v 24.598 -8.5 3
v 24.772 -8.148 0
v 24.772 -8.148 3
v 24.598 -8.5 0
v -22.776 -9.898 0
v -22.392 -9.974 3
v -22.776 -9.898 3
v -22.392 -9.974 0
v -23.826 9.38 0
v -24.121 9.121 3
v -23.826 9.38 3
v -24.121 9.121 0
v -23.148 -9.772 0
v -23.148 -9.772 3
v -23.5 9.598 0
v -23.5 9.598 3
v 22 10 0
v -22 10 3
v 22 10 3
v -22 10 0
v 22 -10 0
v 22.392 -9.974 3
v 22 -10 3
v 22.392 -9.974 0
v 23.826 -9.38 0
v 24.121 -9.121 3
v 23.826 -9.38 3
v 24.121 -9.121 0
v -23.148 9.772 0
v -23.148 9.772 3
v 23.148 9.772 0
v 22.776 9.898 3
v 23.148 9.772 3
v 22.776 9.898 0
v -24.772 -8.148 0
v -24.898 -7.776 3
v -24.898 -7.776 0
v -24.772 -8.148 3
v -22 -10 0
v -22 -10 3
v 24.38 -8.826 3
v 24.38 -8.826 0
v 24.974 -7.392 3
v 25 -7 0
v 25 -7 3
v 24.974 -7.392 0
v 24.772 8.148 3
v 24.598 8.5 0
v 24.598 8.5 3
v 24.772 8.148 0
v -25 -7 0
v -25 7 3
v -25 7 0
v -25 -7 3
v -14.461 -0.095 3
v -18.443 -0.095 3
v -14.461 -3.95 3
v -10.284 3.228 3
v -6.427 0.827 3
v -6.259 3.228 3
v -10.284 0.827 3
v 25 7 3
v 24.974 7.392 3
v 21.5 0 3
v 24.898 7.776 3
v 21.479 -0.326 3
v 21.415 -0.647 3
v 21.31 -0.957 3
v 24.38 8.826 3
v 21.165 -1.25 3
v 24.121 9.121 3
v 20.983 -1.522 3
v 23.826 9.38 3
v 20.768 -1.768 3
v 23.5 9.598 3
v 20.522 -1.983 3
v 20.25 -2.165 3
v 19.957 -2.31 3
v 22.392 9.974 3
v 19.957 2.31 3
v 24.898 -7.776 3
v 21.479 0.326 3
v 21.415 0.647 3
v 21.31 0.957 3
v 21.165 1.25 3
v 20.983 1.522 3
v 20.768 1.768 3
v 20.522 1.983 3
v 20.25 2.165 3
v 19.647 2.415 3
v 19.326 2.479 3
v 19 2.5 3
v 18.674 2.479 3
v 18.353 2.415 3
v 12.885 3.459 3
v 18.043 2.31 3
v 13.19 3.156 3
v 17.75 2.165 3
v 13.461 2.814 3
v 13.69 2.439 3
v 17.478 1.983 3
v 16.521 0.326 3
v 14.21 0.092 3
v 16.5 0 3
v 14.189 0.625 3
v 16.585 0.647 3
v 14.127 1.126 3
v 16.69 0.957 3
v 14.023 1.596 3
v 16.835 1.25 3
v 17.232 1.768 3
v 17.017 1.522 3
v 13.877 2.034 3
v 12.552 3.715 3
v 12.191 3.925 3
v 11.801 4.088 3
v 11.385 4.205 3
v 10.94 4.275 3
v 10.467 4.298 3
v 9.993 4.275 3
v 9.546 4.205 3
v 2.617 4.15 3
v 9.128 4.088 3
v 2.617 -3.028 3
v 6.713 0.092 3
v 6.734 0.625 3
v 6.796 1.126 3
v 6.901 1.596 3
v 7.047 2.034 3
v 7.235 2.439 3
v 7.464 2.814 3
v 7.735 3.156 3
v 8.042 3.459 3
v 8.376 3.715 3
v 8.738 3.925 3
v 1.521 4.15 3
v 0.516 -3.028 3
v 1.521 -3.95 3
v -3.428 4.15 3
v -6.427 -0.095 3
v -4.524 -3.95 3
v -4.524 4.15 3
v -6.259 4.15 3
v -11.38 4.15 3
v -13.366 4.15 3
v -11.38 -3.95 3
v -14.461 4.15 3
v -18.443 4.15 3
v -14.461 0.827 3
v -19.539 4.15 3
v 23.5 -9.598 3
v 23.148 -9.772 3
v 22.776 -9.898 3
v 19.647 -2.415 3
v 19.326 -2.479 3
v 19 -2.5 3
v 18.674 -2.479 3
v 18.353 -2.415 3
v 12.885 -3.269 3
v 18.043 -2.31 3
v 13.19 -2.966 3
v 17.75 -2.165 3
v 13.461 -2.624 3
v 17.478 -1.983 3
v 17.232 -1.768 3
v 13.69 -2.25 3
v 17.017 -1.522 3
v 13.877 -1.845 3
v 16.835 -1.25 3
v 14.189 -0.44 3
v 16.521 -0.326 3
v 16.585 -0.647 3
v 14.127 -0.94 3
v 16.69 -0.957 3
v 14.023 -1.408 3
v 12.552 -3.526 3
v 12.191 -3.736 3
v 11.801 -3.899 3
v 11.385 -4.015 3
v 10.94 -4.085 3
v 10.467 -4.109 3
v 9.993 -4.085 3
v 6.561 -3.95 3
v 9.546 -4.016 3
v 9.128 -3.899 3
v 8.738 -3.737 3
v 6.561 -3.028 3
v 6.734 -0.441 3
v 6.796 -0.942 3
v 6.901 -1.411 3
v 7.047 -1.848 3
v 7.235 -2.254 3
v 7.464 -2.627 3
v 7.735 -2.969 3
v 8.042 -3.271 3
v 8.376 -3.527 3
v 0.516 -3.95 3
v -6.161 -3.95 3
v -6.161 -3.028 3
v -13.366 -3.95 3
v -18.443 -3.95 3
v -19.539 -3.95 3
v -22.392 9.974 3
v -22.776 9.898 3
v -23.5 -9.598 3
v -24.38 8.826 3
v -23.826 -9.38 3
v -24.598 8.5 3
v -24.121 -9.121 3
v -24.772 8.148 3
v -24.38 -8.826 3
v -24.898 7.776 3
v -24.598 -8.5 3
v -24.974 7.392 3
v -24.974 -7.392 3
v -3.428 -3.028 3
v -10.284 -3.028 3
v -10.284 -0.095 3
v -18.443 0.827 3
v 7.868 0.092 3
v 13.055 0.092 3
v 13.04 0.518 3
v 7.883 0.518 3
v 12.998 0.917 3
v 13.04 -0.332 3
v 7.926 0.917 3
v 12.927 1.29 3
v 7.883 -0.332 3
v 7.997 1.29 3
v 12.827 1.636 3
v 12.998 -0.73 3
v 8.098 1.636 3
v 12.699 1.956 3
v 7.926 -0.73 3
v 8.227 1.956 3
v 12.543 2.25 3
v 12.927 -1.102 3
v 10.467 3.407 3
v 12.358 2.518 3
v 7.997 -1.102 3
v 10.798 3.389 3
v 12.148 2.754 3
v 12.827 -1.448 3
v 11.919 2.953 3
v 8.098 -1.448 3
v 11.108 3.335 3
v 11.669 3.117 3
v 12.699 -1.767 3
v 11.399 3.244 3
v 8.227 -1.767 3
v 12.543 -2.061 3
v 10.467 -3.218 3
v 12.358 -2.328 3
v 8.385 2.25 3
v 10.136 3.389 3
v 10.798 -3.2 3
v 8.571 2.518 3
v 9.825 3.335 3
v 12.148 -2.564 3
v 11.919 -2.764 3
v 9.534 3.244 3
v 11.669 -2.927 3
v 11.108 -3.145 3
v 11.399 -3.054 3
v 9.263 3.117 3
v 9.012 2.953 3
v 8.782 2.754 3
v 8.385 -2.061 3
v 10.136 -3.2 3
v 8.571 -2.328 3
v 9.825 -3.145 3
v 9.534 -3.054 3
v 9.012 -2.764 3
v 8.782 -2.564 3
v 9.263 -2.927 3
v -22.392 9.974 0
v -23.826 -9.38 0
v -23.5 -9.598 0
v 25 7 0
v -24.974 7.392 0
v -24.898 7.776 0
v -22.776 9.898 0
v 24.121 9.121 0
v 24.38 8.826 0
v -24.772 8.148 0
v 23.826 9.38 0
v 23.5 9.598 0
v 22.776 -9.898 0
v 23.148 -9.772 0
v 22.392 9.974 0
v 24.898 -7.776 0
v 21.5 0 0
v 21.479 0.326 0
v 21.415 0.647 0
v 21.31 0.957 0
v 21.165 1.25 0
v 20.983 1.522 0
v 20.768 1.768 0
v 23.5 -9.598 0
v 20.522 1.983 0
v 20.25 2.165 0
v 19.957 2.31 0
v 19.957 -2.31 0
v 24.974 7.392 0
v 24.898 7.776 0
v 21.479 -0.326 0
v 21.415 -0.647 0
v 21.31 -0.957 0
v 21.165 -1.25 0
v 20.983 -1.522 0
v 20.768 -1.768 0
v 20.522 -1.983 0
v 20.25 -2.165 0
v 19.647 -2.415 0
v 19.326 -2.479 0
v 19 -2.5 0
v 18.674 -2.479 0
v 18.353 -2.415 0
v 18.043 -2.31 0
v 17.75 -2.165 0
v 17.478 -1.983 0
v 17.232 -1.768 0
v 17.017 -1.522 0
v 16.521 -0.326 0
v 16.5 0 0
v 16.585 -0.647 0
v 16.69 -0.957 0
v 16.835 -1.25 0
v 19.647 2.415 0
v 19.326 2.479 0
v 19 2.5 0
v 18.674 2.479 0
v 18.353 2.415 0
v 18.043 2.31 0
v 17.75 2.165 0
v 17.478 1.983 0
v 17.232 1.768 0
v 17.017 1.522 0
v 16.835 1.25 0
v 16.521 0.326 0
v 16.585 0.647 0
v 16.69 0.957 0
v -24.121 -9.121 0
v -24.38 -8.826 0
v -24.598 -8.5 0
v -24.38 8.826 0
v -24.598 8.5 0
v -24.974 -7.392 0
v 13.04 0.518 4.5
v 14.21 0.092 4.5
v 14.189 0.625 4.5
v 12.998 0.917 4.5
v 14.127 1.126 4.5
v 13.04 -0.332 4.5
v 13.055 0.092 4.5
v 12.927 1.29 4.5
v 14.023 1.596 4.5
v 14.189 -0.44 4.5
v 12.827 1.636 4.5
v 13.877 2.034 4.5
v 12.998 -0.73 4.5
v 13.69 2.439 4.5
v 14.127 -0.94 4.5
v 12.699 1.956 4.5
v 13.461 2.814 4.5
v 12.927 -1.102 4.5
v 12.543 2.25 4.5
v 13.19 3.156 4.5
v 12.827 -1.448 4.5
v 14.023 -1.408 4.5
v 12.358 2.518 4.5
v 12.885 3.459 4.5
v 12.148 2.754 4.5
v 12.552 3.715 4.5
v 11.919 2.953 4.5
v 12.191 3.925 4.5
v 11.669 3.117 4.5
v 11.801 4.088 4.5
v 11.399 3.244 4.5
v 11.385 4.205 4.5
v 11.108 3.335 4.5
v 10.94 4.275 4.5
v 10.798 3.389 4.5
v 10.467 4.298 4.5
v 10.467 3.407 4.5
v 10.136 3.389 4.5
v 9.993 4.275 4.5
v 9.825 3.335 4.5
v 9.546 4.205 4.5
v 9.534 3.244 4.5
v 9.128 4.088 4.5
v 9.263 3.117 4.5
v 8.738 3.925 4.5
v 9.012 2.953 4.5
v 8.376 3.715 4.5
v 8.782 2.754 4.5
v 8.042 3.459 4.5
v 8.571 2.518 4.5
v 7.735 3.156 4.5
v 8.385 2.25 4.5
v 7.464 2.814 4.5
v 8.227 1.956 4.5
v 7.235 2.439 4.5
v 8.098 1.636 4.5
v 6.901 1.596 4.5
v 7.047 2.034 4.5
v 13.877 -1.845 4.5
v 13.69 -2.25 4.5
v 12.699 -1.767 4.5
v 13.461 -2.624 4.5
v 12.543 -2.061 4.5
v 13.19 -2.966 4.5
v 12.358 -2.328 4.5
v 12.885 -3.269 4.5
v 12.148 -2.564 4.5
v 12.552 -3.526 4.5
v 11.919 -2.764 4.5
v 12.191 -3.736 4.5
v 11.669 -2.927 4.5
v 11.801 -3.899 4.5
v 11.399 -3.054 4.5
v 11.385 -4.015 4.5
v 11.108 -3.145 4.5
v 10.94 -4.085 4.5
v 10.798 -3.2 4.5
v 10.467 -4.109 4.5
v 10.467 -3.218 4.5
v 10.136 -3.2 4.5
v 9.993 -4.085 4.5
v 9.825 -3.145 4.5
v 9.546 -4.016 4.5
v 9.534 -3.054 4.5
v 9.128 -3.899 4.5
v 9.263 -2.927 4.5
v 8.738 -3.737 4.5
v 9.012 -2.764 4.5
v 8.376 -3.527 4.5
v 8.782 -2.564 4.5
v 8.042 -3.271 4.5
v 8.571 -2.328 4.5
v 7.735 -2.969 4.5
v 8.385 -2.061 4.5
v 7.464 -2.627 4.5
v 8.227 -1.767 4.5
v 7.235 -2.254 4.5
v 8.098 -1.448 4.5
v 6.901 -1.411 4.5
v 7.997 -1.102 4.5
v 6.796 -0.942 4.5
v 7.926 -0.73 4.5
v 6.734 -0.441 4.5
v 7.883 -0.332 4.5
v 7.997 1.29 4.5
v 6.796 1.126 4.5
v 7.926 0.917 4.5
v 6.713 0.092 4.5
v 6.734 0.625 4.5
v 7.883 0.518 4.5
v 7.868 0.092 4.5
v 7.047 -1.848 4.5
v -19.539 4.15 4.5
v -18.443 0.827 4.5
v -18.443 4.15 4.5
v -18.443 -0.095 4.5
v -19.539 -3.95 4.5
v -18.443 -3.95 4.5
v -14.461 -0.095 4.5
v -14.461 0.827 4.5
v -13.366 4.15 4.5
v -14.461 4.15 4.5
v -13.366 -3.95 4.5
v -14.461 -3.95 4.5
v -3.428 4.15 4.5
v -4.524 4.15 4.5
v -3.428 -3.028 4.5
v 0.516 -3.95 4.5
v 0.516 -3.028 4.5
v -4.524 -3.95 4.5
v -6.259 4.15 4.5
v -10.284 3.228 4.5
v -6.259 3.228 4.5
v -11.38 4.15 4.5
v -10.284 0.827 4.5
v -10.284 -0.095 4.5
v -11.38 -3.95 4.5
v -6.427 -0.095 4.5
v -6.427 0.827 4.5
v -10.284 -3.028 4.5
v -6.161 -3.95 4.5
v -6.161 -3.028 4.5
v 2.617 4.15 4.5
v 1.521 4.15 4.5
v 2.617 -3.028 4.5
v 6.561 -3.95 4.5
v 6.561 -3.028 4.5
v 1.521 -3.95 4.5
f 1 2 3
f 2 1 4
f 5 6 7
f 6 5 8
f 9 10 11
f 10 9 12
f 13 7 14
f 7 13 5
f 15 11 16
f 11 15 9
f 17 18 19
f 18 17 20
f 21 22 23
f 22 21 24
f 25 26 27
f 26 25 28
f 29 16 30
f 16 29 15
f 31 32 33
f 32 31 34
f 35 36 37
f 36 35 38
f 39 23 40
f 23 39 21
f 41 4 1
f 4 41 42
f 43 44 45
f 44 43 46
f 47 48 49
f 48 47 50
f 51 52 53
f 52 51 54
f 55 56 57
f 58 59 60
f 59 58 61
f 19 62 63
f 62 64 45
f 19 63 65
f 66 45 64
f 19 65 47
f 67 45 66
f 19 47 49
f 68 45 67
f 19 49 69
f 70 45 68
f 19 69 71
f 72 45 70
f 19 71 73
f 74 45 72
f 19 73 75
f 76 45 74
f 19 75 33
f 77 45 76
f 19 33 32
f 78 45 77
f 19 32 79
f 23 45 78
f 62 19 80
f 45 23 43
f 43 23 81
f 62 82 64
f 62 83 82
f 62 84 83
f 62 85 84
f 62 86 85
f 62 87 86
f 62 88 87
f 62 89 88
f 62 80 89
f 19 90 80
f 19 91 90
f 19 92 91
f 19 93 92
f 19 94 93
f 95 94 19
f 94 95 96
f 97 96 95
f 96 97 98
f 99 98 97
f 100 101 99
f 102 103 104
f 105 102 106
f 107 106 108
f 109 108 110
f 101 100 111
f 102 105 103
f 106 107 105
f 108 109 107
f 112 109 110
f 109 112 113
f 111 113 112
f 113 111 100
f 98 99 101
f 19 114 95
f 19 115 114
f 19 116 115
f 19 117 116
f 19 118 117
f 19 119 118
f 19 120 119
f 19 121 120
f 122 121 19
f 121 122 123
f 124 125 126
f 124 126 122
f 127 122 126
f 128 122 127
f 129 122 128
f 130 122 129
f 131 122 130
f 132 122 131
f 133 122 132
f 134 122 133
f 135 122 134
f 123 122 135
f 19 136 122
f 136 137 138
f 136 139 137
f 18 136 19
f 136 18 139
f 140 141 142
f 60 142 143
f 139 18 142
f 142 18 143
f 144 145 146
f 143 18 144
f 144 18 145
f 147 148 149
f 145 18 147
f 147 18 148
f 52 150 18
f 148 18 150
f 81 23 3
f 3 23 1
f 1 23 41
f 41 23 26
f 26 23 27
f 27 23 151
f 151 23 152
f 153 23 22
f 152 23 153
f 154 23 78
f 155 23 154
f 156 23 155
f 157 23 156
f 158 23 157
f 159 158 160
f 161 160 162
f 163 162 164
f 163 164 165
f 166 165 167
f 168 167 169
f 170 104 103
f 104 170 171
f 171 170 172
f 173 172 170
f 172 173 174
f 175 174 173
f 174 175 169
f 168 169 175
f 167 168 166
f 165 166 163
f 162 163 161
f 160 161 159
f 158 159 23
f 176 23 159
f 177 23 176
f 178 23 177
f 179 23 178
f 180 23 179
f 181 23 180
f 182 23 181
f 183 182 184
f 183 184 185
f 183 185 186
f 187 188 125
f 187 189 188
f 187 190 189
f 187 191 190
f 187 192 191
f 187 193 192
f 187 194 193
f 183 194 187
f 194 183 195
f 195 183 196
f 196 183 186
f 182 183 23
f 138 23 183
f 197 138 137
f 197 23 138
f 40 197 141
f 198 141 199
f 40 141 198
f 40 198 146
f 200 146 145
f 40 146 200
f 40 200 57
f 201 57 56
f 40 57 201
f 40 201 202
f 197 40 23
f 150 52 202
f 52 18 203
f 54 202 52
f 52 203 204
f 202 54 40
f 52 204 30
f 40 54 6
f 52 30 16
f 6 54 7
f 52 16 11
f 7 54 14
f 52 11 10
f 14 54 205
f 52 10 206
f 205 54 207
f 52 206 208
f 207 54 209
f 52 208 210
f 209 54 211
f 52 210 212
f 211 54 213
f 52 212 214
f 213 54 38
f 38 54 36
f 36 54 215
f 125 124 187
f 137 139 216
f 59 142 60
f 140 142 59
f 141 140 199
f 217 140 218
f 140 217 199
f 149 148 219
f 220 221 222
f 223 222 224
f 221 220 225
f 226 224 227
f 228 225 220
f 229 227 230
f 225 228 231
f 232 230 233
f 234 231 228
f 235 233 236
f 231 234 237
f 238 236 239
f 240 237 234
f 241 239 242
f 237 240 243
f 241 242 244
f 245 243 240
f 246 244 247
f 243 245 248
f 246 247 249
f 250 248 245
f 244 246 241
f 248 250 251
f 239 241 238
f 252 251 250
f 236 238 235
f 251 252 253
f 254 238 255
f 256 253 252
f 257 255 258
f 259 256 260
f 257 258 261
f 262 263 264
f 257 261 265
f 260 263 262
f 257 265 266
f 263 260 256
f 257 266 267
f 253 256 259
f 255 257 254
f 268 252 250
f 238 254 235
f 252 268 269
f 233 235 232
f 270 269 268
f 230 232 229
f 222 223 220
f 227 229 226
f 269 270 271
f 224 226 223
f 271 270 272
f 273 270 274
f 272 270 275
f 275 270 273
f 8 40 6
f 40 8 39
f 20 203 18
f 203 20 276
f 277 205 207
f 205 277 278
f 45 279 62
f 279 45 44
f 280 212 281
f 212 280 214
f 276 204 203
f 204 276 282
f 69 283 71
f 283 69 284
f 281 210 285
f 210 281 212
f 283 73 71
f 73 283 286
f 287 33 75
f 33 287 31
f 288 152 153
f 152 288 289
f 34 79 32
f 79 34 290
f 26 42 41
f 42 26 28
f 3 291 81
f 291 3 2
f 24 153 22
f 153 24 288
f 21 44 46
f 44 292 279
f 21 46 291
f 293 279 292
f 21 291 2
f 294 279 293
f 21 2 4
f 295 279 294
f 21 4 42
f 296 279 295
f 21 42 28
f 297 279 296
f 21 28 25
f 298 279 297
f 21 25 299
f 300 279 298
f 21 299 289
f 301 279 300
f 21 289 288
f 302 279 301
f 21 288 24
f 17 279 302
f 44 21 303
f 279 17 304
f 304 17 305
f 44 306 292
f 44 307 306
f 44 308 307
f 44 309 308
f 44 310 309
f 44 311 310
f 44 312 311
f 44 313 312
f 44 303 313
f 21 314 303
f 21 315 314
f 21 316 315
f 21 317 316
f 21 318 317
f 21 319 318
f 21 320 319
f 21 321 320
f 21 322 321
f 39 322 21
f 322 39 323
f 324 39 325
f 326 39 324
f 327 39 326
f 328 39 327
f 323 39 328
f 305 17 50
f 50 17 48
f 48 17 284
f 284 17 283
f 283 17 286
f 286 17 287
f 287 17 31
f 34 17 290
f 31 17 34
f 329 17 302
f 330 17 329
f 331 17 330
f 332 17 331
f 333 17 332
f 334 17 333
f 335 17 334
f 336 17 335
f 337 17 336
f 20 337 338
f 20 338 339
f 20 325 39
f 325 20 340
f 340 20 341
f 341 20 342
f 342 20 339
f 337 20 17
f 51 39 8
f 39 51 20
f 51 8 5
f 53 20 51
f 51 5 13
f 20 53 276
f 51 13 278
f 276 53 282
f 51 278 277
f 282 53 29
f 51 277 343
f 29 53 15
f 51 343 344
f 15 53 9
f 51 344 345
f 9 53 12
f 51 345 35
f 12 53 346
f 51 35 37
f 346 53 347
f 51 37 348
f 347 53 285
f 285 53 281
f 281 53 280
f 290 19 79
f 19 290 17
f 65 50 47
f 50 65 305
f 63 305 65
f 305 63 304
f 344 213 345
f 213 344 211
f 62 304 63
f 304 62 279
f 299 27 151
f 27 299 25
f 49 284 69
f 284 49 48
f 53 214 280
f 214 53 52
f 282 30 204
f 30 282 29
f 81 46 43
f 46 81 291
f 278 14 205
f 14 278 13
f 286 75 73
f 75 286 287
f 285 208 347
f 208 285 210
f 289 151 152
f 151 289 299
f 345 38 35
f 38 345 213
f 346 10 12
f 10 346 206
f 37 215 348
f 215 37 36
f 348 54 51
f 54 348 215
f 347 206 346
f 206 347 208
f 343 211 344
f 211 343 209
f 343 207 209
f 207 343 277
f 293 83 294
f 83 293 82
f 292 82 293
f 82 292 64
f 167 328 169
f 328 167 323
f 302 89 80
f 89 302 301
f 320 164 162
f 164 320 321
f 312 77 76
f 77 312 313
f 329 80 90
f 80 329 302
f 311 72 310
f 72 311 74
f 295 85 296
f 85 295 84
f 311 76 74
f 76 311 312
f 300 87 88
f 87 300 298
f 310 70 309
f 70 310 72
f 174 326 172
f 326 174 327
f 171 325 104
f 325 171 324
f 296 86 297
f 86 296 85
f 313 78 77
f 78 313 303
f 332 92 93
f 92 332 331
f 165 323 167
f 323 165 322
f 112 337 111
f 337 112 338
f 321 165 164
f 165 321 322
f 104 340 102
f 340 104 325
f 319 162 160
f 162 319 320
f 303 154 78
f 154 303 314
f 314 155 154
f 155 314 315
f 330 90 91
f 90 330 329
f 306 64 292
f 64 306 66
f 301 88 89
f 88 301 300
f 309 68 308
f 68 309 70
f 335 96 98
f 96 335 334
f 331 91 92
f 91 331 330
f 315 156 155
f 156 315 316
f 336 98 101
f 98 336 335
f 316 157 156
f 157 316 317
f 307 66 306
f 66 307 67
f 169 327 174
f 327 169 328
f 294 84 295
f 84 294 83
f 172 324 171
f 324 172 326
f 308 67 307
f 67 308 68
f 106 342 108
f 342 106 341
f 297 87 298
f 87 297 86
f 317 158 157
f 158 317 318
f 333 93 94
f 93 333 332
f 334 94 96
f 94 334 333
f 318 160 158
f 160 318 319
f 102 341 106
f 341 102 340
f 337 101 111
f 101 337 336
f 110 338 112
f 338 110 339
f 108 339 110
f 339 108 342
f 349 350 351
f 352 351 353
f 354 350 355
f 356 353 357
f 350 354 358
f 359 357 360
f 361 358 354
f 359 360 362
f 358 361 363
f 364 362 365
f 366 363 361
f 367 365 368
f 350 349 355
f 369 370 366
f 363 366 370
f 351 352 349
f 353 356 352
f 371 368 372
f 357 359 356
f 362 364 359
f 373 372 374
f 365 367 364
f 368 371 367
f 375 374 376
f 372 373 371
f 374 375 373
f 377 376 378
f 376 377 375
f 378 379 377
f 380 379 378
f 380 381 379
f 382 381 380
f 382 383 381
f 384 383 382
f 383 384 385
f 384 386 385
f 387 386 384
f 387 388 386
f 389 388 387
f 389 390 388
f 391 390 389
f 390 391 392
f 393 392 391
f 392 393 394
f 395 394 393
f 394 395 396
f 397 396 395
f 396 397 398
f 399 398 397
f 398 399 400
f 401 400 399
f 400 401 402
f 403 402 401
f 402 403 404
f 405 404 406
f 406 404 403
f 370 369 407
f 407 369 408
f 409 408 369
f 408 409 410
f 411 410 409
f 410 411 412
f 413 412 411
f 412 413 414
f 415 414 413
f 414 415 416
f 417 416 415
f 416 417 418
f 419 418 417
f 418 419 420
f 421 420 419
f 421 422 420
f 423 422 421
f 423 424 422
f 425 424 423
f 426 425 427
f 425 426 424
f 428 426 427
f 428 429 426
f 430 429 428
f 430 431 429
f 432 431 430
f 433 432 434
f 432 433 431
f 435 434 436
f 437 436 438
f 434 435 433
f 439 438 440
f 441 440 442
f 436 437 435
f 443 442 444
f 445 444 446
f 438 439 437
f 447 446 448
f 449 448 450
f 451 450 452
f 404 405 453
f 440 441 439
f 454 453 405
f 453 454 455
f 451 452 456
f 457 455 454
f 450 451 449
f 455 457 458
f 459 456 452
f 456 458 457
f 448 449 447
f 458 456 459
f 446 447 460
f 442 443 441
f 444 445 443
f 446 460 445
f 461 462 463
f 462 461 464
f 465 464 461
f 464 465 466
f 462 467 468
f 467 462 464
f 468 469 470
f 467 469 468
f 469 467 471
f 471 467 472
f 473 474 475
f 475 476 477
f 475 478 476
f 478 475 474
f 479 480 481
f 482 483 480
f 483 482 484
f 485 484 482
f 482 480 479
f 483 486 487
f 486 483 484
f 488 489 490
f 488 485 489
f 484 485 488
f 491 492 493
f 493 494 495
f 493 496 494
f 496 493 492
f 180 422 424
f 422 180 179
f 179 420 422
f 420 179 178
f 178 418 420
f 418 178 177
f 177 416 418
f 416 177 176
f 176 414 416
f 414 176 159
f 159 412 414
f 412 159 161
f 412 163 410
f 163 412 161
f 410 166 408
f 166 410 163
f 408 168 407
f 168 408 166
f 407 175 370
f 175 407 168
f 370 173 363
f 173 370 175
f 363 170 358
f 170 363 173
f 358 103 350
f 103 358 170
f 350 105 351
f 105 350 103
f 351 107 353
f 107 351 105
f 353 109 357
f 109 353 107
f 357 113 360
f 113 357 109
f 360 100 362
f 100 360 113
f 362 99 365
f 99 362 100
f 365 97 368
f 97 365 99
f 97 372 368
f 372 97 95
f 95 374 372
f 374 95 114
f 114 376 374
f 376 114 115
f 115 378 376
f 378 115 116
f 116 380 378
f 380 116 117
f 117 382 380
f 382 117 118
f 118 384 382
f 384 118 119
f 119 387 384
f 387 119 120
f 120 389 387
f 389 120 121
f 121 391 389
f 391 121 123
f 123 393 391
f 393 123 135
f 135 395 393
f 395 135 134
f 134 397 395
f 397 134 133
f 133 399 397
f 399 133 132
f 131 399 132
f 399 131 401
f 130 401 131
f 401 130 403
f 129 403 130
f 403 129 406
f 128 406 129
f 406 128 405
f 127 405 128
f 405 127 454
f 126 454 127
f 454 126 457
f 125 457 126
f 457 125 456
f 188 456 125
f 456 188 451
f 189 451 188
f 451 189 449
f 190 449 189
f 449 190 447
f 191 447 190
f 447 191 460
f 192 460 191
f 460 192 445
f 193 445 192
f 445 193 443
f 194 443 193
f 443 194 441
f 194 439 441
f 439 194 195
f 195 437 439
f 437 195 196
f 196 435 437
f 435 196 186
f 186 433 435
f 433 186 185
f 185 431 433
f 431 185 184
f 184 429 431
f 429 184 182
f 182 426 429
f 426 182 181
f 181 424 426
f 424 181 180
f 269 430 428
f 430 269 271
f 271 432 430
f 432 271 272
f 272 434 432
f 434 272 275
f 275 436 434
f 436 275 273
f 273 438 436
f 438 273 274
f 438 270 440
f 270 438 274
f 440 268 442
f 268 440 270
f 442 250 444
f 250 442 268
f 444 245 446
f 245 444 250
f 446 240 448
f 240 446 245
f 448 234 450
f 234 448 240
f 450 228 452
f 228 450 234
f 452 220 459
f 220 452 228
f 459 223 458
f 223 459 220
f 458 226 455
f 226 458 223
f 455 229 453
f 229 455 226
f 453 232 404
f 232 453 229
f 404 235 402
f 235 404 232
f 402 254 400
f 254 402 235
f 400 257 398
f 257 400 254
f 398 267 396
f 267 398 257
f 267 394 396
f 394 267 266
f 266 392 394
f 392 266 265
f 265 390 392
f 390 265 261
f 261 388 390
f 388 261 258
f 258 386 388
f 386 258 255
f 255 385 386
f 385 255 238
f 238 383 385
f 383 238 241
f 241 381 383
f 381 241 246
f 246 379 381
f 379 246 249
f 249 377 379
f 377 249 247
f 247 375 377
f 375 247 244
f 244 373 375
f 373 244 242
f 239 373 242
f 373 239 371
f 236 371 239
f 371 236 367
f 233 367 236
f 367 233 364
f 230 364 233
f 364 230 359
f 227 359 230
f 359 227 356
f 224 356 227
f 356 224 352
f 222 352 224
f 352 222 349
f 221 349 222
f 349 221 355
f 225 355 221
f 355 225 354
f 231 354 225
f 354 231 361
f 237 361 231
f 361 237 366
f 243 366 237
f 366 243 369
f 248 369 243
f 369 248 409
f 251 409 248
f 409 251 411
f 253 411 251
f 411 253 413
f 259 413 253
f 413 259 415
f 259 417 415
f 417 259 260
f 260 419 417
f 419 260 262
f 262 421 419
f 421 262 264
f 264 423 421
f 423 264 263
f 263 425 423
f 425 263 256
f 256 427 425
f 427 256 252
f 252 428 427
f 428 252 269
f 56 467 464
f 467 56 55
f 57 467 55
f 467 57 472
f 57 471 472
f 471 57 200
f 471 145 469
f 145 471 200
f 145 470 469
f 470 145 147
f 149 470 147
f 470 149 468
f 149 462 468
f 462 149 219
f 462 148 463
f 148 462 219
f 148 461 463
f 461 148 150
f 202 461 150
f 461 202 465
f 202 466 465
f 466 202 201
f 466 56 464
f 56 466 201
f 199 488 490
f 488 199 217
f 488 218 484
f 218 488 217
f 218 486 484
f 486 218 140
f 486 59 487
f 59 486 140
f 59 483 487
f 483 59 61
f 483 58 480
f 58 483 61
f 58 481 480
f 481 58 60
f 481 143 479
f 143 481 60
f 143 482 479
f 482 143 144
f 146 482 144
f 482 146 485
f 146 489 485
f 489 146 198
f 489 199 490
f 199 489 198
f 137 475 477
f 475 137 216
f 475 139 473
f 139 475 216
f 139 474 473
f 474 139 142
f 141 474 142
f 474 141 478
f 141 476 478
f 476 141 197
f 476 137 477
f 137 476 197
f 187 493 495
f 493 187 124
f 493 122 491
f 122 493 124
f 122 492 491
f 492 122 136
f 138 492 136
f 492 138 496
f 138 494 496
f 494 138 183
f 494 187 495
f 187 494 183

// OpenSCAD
/* [Text Settings] */

// The text to display on the keychain
text = "HELLO";

// Font size in mm
font_size = 8; // [4:1:20]

// Text depth (how raised the text is)
text_depth = 1.5; // [0.5:0.1:3]

/* [Dimensions] */

// Total width in mm
width = 50; // [30:1:80]

// Total height in mm
height = 20; // [15:1:40]

// Base thickness in mm
thickness = 3; // [2:0.5:6]

// Corner radius in mm
corner_radius = 3; // [0:0.5:10]

/* [Keyring Hole] */

// Enable keyring hole
enable_hole = true;

// Hole diameter in mm
hole_diameter = 5; // [3:0.5:8]

// Distance of hole center from edge
hole_offset = 6; // [4:0.5:12]

/* [Hidden] */
$fn = 48;

module rounded_rect(w, h, t, r) {
    if (r > 0) {
        hull() {
            for (x = [r, w - r]) {
                for (y = [r, h - r]) {
                    translate([x, y, 0])
                        cylinder(h = t, r = r);
                }
            }
        }
    } else {
        cube([w, h, t]);
    }
}

// Main body
difference() {
    // Base plate
    translate([-width/2, -height/2, 0])
        rounded_rect(width, height, thickness, corner_radius);

    // Keyring hole
    if (enable_hole) {
        translate([width/2 - hole_offset, 0, -1])
            cylinder(h = thickness + 2, d = hole_diameter);
    }
}

// Raised text
text_x_offset = enable_hole ? -(hole_offset / 2) : 0;
translate([text_x_offset, 0, thickness])
    linear_extrude(height = text_depth)
        text(text, size = font_size, font = "/fonts/LiberationSans-Regular.ttf", halign = "center", valign = "center");
